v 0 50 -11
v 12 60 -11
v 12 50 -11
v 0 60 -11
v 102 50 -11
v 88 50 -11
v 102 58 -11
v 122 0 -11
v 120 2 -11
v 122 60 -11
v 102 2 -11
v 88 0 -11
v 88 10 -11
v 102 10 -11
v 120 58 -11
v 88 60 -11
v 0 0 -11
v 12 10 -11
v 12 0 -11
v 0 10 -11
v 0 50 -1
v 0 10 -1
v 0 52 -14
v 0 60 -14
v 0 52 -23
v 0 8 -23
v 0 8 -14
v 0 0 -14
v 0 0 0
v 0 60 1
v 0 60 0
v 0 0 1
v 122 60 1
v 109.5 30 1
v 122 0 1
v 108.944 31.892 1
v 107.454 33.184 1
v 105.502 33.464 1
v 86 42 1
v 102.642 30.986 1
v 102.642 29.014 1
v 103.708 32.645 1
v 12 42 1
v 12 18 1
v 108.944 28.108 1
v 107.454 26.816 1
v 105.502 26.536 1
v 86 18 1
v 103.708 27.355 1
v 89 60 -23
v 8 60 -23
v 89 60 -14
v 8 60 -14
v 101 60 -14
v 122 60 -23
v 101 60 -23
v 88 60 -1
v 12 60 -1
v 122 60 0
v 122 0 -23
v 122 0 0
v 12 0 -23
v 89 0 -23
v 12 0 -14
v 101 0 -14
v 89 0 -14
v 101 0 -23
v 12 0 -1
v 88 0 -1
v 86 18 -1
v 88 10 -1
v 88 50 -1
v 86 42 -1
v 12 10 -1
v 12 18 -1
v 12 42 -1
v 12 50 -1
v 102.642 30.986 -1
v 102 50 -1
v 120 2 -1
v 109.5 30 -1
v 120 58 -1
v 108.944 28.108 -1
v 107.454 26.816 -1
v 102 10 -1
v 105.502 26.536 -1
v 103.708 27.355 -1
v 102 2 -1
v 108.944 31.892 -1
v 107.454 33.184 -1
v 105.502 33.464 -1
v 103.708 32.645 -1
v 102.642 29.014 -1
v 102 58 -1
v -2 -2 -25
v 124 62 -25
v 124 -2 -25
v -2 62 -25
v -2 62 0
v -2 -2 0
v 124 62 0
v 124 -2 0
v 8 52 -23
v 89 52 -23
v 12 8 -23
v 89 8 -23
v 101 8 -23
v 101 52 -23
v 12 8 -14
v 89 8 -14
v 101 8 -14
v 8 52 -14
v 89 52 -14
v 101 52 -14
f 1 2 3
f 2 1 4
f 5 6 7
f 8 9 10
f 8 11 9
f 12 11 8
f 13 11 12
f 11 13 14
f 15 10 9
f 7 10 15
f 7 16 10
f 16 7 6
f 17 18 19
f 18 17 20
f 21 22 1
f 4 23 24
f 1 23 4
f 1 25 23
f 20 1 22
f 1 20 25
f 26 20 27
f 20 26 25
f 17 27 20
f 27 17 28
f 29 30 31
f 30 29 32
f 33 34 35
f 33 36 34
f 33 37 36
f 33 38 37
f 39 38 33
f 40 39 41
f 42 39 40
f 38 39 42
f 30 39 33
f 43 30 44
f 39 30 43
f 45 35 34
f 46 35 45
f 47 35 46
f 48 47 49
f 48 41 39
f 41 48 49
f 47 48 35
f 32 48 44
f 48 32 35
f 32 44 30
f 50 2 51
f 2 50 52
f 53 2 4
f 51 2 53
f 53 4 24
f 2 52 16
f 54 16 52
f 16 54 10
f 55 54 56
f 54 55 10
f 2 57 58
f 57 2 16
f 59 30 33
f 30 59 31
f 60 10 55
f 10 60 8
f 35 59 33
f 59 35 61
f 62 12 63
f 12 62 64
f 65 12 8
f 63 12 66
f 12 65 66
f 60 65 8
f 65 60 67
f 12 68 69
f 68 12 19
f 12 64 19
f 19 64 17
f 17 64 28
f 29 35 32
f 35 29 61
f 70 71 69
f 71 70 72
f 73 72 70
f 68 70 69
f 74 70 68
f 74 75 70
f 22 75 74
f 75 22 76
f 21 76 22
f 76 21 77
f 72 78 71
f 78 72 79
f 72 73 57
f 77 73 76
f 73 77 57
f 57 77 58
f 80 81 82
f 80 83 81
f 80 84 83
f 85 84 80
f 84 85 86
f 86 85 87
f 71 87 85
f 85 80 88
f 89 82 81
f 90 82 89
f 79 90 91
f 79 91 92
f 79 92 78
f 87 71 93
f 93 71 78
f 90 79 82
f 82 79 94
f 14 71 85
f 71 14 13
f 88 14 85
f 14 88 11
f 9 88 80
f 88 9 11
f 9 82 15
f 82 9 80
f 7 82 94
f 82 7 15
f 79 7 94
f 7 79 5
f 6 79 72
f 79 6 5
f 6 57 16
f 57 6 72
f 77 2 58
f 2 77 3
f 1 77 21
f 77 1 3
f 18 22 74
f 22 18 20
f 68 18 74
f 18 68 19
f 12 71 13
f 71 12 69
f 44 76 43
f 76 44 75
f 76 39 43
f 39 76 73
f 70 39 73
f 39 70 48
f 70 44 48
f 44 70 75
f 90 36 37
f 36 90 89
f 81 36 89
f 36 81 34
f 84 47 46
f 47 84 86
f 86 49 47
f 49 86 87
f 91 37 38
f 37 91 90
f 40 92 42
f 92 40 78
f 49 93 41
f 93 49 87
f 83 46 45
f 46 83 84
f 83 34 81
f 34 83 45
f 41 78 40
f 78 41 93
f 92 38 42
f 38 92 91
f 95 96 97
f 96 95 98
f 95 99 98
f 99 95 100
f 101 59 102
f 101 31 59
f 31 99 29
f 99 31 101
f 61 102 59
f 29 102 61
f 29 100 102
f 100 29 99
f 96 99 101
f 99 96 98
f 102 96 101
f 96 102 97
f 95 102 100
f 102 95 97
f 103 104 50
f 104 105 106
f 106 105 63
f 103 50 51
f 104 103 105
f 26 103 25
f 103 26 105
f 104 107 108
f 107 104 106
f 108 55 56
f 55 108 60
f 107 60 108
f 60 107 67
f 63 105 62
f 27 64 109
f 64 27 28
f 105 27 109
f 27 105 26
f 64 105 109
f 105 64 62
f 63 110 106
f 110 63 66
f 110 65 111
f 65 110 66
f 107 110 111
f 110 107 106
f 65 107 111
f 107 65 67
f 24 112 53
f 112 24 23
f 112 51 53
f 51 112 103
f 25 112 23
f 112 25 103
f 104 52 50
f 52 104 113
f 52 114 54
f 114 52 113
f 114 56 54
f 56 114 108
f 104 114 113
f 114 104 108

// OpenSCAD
color("red"){
translate([0, 0, -15])



difference()
{
difference(){
translate([0, 0, 4])
linear_extrude(12)
square ([122, 60]);

translate([2, 10, -1])
linear_extrude(15){
translate([-4, 0, 0])
square ([120, 40]);
translate([100, -8, -1])
square ([18, 56]);
translate([10, 8, -1])
square ([76, 50]);
translate([10, -18, -1])
square ([76, 40]);
}
}
translate([12, 18, 0])
linear_extrude(20)
square ([74, 24]);
translate([106, 30,  0])
linear_extrude(20)
circle(d=7);


}

}

difference(){
translate([-2, -2, -25])
linear_extrude(25)
square ([126, 64]);

translate([0, 0, -23])
linear_extrude(25)
square ([122, 60]);

}
translate([0, 0, -23])
linear_extrude(9)
square ([12, 8]);

translate([89, 0, -23])
linear_extrude(9)
square ([12, 8]);

translate([0, 52, -23])
linear_extrude(9)
square ([8, 8]);

translate([89, 52, -23])
linear_extrude(9)
square ([12, 8]);
